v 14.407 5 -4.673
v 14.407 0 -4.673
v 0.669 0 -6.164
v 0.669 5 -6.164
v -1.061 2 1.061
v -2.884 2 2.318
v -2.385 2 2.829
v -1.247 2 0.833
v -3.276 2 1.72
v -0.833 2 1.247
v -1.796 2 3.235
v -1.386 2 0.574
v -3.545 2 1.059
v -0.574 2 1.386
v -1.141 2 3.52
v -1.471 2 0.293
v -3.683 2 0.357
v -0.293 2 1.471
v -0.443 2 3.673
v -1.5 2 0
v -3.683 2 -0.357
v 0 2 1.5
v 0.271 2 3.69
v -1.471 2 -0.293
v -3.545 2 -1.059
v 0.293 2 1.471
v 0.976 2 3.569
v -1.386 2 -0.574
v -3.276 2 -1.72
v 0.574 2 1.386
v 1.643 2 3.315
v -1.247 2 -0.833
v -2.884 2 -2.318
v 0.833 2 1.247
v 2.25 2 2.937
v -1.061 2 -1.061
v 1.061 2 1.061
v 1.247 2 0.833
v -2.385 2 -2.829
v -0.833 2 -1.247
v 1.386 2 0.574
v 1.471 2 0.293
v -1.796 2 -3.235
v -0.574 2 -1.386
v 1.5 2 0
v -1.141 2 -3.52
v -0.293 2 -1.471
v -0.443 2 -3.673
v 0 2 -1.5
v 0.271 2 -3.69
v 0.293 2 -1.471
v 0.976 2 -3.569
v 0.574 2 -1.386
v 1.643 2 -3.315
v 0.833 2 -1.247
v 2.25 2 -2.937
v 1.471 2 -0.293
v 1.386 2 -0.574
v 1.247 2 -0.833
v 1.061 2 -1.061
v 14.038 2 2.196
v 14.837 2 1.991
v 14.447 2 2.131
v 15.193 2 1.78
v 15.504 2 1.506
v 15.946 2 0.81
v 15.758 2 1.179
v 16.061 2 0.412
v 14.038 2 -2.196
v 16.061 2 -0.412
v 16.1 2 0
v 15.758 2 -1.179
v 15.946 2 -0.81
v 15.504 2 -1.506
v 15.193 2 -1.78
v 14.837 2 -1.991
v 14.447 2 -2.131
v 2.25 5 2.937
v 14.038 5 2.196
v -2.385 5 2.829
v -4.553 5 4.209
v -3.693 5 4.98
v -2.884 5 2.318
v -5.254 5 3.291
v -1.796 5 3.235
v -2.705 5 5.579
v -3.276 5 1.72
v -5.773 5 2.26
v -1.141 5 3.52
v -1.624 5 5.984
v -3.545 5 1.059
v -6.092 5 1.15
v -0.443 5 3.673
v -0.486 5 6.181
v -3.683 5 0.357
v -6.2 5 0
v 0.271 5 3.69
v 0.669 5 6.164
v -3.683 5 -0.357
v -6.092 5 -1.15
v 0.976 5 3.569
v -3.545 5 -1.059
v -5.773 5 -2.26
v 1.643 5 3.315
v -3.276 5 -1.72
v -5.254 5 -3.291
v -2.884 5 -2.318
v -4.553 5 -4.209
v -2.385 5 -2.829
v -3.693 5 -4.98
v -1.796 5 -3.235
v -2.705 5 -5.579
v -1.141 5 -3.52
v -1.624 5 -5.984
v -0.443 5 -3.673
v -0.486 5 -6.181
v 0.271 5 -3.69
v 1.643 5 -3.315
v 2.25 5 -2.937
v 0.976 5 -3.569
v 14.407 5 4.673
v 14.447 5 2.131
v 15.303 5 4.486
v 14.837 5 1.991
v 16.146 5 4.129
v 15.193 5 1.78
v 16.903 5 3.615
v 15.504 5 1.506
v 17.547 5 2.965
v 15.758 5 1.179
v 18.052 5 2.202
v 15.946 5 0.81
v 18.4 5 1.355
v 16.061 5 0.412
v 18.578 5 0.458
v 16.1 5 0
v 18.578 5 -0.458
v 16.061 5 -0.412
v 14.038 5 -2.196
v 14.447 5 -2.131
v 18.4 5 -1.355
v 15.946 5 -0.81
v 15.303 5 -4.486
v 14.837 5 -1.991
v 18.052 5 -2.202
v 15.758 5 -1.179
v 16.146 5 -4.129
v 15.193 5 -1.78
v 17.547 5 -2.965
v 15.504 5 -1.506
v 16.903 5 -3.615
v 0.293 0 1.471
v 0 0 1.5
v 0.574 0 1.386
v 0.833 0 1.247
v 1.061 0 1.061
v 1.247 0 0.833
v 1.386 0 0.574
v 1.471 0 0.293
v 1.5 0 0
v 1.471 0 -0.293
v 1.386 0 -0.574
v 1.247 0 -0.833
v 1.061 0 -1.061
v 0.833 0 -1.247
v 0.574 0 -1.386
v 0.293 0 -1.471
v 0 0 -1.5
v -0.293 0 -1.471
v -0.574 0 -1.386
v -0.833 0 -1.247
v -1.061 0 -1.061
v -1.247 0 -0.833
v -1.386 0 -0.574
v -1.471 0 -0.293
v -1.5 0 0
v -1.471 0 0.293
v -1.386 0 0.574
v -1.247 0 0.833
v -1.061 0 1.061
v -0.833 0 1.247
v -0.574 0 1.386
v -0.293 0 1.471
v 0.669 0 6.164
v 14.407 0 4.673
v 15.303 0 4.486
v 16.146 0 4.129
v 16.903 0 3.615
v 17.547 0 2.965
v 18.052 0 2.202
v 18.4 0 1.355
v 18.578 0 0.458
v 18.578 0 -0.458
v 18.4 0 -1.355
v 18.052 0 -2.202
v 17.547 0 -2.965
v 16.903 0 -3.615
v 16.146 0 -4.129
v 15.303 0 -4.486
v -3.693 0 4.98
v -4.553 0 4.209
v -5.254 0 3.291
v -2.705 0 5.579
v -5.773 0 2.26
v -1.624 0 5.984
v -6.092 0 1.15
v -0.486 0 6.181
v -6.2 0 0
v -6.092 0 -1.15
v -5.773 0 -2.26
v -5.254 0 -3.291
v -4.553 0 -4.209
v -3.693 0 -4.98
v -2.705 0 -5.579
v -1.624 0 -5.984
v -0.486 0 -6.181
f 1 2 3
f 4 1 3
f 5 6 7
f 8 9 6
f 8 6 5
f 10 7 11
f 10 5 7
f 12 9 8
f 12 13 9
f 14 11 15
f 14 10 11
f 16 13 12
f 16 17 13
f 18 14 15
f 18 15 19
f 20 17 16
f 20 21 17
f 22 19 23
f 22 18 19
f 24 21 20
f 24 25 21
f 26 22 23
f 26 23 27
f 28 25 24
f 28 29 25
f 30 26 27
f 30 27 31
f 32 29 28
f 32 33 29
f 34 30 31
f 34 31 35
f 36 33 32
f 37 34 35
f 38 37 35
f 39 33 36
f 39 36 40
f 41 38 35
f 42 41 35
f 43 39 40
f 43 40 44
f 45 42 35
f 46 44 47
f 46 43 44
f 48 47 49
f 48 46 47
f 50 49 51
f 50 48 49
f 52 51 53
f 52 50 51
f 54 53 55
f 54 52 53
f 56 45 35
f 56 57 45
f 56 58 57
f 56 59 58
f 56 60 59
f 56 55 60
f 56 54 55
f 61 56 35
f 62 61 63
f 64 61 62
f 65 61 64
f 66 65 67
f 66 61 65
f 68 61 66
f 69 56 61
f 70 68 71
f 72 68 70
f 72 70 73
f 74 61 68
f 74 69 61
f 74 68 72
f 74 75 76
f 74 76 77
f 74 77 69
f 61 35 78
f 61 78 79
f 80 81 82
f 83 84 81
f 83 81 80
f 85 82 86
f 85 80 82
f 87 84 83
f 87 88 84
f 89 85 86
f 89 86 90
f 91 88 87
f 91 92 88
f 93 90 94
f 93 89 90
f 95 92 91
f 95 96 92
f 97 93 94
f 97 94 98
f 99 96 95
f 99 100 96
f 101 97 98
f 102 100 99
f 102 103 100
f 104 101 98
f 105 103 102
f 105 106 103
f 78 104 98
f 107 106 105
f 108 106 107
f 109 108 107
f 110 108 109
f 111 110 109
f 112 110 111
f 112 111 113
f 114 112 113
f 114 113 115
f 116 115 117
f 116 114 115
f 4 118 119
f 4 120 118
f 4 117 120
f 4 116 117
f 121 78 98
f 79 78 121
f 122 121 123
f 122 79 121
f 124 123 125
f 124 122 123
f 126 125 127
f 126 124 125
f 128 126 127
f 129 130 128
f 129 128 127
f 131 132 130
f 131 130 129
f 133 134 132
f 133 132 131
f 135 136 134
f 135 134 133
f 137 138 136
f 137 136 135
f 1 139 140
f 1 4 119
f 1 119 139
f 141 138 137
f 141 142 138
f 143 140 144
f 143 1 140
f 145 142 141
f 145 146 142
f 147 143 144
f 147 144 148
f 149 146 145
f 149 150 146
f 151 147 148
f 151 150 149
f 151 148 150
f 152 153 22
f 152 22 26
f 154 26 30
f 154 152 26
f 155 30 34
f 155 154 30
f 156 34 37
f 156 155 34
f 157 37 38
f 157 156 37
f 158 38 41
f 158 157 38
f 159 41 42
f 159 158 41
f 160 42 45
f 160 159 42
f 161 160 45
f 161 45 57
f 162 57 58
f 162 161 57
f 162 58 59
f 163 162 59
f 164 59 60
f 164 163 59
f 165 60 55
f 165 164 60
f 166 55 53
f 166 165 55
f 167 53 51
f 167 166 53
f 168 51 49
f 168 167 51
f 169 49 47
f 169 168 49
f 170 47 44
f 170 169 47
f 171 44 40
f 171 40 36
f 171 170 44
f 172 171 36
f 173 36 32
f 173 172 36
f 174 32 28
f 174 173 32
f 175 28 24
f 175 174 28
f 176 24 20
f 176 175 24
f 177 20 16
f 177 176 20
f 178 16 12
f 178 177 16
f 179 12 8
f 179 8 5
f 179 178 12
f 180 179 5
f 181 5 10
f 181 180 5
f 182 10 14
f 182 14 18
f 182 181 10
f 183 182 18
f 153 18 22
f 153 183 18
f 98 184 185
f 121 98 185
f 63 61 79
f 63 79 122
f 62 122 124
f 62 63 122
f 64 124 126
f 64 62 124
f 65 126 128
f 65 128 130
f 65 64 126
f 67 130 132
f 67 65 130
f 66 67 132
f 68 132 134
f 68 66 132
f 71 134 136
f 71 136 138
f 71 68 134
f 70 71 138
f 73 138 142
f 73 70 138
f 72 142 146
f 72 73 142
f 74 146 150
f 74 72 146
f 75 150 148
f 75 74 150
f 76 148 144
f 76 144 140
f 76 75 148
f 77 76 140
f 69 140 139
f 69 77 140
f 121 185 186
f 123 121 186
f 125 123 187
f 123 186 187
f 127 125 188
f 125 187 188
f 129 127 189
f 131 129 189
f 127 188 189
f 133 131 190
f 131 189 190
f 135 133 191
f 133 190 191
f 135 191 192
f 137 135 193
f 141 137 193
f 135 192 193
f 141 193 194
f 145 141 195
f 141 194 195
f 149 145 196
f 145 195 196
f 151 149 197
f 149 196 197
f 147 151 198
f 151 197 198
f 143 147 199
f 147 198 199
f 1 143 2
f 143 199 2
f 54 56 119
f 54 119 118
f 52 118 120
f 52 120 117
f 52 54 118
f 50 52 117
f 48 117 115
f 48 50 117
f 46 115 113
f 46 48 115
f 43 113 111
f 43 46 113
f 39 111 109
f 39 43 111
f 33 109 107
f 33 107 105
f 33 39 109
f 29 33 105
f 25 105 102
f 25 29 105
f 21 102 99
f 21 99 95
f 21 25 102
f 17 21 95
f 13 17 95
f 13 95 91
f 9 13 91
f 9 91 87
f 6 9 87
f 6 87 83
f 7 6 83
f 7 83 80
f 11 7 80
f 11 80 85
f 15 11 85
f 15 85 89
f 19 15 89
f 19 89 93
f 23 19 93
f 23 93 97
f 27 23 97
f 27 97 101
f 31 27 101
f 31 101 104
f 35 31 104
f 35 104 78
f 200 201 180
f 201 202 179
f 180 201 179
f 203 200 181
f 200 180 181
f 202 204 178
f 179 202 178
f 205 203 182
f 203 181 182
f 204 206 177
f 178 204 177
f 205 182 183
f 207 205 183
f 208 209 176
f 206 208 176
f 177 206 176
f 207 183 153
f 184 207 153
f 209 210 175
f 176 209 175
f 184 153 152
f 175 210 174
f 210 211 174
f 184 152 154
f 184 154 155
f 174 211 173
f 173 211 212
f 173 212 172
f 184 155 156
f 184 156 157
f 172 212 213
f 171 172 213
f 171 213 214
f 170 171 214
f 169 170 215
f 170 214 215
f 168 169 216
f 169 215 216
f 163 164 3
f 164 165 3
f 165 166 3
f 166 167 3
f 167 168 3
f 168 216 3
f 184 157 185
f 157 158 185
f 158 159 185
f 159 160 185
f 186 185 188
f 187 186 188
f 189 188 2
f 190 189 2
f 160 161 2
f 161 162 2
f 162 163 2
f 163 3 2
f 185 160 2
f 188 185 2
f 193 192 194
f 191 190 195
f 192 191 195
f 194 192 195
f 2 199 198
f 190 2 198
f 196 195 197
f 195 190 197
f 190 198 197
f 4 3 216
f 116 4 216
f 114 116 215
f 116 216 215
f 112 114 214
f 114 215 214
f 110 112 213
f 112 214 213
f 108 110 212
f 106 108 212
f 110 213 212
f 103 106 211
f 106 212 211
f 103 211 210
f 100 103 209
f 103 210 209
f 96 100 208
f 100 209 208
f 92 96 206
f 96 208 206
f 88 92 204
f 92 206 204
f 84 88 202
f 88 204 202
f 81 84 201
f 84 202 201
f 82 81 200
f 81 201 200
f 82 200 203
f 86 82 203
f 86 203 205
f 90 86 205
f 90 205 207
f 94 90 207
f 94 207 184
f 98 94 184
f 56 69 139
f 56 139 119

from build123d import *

# Parameters (mm, degrees)
SKETCH1_R           = 1.5
BOSS_EXTRUDE1_DEPTH = 2
BOSS_EXTRUDE2_DEPTH = 5


with BuildPart() as part:
    # Sketch1 → Boss-Extrude1 (new body)
    with BuildSketch(Plane(origin=(0, 0, 0), x_dir=(1, 0, 0), z_dir=(0, 1, 0))):
        with BuildLine():
            Line((14.03813079, 2.195659328), (2.25, 2.937260629))
            ThreePointArc((2.25, 2.937260629), (-3.7, 0), (2.25, -2.937260629))
            Line((2.25, -2.937260629), (14.03813079, -2.195659328))
            ThreePointArc((14.03813079, -2.195659328), (16.1, 0), (14.03813079, 2.195659328))
        make_face()
        Circle(SKETCH1_R, mode=Mode.SUBTRACT)
    extrude(amount=BOSS_EXTRUDE1_DEPTH)

    # Sketch1<3> → Boss-Extrude2 (add)
    with BuildSketch(Plane(origin=(0, 0, 0), x_dir=(1, 0, 0), z_dir=(0, 1, 0))):
        with BuildLine():
            Line((14.407194245, 4.672553263), (0.669064748, 6.163793666))
            ThreePointArc((0.669064748, 6.163793666), (-6.2, 0), (0.669064748, -6.163793666))
            Line((0.669064748, -6.163793666), (14.407194245, -4.672553263))
            ThreePointArc((14.407194245, -4.672553263), (18.6, 0), (14.407194245, 4.672553263))
        make_face()
        with BuildLine():
            ThreePointArc((2.25, -2.937260629), (-3.7, 0), (2.25, 2.937260629))
            Line((2.25, 2.937260629), (14.03813079, 2.195659328))
            ThreePointArc((14.03813079, 2.195659328), (16.1, 0), (14.03813079, -2.195659328))
            Line((14.03813079, -2.195659328), (2.25, -2.937260629))
        make_face(mode=Mode.SUBTRACT)
    extrude(amount=BOSS_EXTRUDE2_DEPTH)


solid = part.part
